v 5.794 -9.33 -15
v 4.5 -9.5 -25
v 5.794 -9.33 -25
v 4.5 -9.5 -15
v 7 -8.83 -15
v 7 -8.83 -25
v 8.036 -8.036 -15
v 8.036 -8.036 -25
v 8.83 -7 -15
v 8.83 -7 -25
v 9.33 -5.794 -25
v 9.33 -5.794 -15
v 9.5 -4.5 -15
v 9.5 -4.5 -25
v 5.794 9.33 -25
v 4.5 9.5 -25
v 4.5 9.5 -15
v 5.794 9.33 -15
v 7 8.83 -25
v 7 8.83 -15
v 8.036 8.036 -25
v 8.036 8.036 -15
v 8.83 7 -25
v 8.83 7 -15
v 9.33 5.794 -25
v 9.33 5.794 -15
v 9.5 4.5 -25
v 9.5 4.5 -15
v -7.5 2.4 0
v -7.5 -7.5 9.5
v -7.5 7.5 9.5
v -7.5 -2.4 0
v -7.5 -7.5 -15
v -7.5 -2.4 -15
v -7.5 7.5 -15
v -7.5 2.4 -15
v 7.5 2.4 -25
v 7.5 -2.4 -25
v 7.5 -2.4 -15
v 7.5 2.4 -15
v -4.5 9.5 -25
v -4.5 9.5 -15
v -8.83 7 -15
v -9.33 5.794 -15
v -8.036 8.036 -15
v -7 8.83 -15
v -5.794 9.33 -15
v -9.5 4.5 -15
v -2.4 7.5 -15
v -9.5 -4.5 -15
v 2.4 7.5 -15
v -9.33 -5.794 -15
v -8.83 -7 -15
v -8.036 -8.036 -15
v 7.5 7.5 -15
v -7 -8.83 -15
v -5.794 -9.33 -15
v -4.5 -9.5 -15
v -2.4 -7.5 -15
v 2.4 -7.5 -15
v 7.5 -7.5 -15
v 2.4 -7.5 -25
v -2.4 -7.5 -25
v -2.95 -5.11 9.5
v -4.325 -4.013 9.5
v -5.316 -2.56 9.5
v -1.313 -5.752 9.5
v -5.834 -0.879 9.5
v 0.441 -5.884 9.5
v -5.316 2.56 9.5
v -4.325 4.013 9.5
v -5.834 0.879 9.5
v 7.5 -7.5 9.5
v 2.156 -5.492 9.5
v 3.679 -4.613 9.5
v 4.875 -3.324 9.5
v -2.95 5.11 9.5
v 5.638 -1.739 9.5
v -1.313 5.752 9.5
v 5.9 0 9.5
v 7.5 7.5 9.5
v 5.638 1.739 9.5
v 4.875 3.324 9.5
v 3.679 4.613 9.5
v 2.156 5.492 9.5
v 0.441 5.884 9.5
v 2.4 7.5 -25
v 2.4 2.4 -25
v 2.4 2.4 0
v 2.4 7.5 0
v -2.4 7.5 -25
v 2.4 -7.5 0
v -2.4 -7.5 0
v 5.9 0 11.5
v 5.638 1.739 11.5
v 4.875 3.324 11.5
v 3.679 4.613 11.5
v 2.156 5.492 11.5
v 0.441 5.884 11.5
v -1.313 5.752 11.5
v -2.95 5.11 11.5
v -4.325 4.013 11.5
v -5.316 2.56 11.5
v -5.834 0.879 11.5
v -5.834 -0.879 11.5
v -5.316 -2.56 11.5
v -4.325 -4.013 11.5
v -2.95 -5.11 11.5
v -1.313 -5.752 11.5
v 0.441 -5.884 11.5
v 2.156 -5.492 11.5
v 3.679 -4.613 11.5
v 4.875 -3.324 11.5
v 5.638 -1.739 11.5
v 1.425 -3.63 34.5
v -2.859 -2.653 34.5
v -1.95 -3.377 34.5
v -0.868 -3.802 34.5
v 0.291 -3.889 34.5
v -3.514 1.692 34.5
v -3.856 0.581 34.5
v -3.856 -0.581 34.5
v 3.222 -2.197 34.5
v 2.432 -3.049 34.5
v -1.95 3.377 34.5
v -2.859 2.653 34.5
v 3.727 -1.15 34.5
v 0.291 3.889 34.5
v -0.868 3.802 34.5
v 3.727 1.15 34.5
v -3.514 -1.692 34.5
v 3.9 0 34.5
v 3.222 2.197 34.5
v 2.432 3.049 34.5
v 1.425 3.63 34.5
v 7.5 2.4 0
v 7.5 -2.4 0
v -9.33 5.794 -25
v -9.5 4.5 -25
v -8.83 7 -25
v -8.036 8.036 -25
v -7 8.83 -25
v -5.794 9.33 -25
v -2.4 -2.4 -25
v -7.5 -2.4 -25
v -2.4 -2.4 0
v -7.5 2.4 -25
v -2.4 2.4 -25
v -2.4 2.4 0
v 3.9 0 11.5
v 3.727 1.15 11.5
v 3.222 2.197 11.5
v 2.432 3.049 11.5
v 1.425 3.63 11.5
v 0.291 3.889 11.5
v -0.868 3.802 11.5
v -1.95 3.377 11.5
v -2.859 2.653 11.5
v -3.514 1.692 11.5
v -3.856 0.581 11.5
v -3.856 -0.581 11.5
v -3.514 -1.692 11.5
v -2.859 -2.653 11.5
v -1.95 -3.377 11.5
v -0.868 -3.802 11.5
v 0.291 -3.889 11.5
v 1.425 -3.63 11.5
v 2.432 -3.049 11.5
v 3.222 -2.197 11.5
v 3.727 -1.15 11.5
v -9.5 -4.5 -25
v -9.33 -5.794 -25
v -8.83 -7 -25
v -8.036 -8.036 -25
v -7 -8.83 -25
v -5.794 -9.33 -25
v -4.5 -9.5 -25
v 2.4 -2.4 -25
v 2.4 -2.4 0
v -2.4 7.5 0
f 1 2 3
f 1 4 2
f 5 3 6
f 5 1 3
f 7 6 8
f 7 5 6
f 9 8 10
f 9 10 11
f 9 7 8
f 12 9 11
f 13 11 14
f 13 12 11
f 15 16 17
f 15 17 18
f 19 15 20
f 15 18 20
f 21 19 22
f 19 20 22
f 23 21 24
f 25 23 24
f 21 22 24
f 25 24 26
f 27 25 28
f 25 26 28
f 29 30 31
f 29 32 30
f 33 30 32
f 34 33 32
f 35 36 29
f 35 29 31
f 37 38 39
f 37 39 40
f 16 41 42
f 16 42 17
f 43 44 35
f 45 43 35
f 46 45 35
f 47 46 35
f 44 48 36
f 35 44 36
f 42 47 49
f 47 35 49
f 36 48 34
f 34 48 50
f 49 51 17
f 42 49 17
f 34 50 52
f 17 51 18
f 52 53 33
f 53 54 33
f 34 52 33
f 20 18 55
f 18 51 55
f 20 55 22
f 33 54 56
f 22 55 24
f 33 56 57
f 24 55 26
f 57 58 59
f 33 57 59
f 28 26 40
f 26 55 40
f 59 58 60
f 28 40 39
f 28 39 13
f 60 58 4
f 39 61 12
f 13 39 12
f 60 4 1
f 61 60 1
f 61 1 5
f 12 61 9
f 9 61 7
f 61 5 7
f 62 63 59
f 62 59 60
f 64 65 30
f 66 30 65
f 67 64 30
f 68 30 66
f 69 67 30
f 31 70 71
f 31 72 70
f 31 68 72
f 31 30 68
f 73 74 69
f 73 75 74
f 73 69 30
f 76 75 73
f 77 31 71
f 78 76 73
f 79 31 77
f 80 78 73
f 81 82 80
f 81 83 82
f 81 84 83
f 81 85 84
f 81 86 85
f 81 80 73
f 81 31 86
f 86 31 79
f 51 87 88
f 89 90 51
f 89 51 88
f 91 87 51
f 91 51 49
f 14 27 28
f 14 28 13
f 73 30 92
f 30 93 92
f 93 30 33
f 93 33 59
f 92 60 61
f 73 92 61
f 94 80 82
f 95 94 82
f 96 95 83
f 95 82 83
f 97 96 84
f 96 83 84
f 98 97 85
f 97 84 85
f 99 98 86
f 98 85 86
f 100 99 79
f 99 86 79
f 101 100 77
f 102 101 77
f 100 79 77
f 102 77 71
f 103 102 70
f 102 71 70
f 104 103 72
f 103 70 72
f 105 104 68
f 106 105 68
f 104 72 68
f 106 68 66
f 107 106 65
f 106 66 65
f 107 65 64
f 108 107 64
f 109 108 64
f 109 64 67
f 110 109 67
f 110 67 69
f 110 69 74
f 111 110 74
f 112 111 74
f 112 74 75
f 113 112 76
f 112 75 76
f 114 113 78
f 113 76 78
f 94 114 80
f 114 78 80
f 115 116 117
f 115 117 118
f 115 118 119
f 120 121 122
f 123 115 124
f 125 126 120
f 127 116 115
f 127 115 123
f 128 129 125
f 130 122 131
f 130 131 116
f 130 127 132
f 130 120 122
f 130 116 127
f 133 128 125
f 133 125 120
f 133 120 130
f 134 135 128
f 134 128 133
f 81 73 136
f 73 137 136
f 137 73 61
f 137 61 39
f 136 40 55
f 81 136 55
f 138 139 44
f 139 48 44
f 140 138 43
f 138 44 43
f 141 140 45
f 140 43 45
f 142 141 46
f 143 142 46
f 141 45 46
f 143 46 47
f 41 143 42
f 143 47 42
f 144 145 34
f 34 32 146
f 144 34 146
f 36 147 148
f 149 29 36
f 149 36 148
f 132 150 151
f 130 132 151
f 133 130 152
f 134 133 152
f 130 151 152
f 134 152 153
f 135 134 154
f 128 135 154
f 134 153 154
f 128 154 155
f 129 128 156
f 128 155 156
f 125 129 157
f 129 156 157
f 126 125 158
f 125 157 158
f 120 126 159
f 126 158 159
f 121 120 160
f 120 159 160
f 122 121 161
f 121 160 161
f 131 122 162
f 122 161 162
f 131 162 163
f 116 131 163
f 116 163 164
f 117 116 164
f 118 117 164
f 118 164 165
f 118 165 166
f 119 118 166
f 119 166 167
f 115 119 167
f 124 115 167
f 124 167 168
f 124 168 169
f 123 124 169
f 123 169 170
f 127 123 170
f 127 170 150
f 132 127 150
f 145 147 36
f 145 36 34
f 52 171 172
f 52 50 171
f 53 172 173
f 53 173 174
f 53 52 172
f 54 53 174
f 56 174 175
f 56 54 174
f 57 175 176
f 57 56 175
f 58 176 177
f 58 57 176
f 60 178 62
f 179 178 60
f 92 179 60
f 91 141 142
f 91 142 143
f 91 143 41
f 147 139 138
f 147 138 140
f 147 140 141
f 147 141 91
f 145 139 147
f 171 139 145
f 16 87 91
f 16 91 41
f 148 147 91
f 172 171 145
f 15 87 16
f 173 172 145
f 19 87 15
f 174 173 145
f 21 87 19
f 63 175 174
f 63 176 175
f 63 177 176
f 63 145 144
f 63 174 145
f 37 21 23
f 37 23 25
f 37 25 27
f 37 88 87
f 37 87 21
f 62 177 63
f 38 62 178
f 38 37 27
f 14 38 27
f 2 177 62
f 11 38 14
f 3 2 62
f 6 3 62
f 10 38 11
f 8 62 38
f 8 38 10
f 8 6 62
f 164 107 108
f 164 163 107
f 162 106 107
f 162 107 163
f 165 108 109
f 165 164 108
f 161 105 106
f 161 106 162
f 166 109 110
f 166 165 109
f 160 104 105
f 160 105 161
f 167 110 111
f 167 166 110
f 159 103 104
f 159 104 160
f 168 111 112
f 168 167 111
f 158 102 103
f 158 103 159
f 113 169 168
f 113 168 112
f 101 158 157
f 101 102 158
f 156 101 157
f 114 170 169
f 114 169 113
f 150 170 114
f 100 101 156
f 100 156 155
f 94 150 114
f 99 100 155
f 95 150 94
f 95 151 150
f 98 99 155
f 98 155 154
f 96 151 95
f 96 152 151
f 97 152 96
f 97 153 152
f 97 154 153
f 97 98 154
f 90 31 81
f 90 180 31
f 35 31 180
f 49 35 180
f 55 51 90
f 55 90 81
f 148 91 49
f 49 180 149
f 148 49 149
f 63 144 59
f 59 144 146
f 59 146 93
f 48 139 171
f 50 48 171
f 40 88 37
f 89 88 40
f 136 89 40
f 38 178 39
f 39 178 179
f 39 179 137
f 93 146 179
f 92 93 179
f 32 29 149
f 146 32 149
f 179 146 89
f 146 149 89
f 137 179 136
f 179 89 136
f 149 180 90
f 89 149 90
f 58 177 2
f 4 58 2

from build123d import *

# Parameters (mm, degrees)
F0_W      = 15
F0_H      = 15
F1_DEPTH  = 7.5
F2_DEPTH  = 2
F3_W      = 5.1
F3_H      = 5.1
F4_DEPTH  = 25
F5_DEPTH  = 2
F6_W      = 19
F6_H      = 19
F7_DEPTH  = 10
F8_R      = 5
F9_R      = 5.9
F9_R_2    = 3.9
F10_DEPTH = 2
F11_DEPTH = 25


with BuildPart() as f1:
    # F0 (on Top) → F1 (new body)
    with BuildSketch(Plane.XY):
        Rectangle(F0_W, F0_H)
        with BuildLine():
            ThreePointArc((3.7416573868, 1.1), (3.8602113808, 0.5556690524), (3.9, 0))
            ThreePointArc((3.9, 0), (3.8602113808, -0.5556690524), (3.7416573868, -1.1))
            ThreePointArc((3.7416573868, -1.1), (0, -3.9), (-3.7416573868, -1.1))
            ThreePointArc((-3.7416573868, -1.1), (-3.9, 0), (-3.7416573868, 1.1))
            ThreePointArc((-3.7416573868, 1.1), (0, 3.9), (3.7416573868, 1.1))
        make_face(mode=Mode.SUBTRACT)
        with BuildLine():
            ThreePointArc((-3.7416573868, -1.1), (0, -3.9), (3.7416573868, -1.1))
            Line((3.7416573868, -1.1), (-3.7416573868, -1.1))
        make_face()
        with BuildLine():
            Line((-3.7416573868, 1.1), (3.7416573868, 1.1))
            ThreePointArc((3.7416573868, 1.1), (0, 3.9), (-3.7416573868, 1.1))
        make_face()
        with BuildLine():
            ThreePointArc((3.7416573868, -1.1), (3.8602113808, -0.5556690524), (3.9, 0))
            ThreePointArc((3.9, 0), (3.8602113808, 0.5556690524), (3.7416573868, 1.1))
            Line((3.7416573868, 1.1), (-3.7416573868, 1.1))
            ThreePointArc((-3.7416573868, 1.1), (-3.9, 0), (-3.7416573868, -1.1))
            Line((-3.7416573868, -1.1), (3.7416573868, -1.1))
        make_face()
    extrude(amount=F1_DEPTH)

    # F0 (on Top) → F2 (join)
    with BuildSketch(Plane.XY):
        with BuildLine():
            ThreePointArc((3.7416573868, -1.1), (3.8602113808, -0.5556690524), (3.9, 0))
            ThreePointArc((3.9, 0), (3.8602113808, 0.5556690524), (3.7416573868, 1.1))
            Line((3.7416573868, 1.1), (-3.7416573868, 1.1))
            ThreePointArc((-3.7416573868, 1.1), (-3.9, 0), (-3.7416573868, -1.1))
            Line((-3.7416573868, -1.1), (3.7416573868, -1.1))
        make_face()
    extrude(amount=F2_DEPTH)

    # F3 (on face) → F4 (join)
    with BuildSketch(Plane(origin=(0, 0, 0), x_dir=(1, 0, 0), z_dir=(0, 0, -1))):
        with Locations((-4.95, -4.95)):
            Rectangle(F3_W, F3_H)
        with Locations((4.95, -4.95)):
            Rectangle(F3_W, F3_H)
        with Locations((4.95, 4.95)):
            Rectangle(F3_W, F3_H)
        with Locations((-4.95, 4.95)):
            Rectangle(F3_W, F3_H)
    extrude(amount=F4_DEPTH)

    # F5 (add): a face of the model
    f5_faces = [f1.faces().sort_by_distance(p)[0] for p in [
        (0, 0, 7.5),
    ]]
    extrude(f5_faces, amount=F5_DEPTH)

    # F6 (on face) → F7 (join)
    with BuildSketch(Plane(origin=(0, 0, -25), x_dir=(1, 0, 0), z_dir=(0, 0, -1))):
        Rectangle(F6_W, F6_H)
        Polygon((-7.5, 2.4), (-7.5, 7.5), (-2.4, 7.5), (2.4, 7.5), (7.5, 7.5), (7.5, 2.4), (7.5, -2.4), (7.5, -7.5), (2.4, -7.5), (-2.4, -7.5), (-7.5, -7.5), (-7.5, -2.4), align=None, mode=Mode.SUBTRACT)
    extrude(amount=-F7_DEPTH)

    # F8
    f8_edges = [f1.edges().sort_by_distance(p)[0] for p in [
        (9.5, -9.5, -20),
        (9.5, 9.5, -20),
        (-9.5, 9.5, -20),
        (-9.5, -9.5, -20),
    ]]
    fillet(f8_edges, radius=F8_R)

    # F9 (on face) → F10 (join)
    with BuildSketch(Plane.XY.offset(9.5)):
        Circle(F9_R)
        Circle(F9_R_2, mode=Mode.SUBTRACT)
    extrude(amount=F10_DEPTH)

    # F11 (add): a face of the model
    f11_faces = [f1.faces().sort_by_distance(p)[0] for p in [
        (0, 0, 9.5),
    ]]
    extrude(f11_faces, amount=F11_DEPTH)


solid = f1.part
